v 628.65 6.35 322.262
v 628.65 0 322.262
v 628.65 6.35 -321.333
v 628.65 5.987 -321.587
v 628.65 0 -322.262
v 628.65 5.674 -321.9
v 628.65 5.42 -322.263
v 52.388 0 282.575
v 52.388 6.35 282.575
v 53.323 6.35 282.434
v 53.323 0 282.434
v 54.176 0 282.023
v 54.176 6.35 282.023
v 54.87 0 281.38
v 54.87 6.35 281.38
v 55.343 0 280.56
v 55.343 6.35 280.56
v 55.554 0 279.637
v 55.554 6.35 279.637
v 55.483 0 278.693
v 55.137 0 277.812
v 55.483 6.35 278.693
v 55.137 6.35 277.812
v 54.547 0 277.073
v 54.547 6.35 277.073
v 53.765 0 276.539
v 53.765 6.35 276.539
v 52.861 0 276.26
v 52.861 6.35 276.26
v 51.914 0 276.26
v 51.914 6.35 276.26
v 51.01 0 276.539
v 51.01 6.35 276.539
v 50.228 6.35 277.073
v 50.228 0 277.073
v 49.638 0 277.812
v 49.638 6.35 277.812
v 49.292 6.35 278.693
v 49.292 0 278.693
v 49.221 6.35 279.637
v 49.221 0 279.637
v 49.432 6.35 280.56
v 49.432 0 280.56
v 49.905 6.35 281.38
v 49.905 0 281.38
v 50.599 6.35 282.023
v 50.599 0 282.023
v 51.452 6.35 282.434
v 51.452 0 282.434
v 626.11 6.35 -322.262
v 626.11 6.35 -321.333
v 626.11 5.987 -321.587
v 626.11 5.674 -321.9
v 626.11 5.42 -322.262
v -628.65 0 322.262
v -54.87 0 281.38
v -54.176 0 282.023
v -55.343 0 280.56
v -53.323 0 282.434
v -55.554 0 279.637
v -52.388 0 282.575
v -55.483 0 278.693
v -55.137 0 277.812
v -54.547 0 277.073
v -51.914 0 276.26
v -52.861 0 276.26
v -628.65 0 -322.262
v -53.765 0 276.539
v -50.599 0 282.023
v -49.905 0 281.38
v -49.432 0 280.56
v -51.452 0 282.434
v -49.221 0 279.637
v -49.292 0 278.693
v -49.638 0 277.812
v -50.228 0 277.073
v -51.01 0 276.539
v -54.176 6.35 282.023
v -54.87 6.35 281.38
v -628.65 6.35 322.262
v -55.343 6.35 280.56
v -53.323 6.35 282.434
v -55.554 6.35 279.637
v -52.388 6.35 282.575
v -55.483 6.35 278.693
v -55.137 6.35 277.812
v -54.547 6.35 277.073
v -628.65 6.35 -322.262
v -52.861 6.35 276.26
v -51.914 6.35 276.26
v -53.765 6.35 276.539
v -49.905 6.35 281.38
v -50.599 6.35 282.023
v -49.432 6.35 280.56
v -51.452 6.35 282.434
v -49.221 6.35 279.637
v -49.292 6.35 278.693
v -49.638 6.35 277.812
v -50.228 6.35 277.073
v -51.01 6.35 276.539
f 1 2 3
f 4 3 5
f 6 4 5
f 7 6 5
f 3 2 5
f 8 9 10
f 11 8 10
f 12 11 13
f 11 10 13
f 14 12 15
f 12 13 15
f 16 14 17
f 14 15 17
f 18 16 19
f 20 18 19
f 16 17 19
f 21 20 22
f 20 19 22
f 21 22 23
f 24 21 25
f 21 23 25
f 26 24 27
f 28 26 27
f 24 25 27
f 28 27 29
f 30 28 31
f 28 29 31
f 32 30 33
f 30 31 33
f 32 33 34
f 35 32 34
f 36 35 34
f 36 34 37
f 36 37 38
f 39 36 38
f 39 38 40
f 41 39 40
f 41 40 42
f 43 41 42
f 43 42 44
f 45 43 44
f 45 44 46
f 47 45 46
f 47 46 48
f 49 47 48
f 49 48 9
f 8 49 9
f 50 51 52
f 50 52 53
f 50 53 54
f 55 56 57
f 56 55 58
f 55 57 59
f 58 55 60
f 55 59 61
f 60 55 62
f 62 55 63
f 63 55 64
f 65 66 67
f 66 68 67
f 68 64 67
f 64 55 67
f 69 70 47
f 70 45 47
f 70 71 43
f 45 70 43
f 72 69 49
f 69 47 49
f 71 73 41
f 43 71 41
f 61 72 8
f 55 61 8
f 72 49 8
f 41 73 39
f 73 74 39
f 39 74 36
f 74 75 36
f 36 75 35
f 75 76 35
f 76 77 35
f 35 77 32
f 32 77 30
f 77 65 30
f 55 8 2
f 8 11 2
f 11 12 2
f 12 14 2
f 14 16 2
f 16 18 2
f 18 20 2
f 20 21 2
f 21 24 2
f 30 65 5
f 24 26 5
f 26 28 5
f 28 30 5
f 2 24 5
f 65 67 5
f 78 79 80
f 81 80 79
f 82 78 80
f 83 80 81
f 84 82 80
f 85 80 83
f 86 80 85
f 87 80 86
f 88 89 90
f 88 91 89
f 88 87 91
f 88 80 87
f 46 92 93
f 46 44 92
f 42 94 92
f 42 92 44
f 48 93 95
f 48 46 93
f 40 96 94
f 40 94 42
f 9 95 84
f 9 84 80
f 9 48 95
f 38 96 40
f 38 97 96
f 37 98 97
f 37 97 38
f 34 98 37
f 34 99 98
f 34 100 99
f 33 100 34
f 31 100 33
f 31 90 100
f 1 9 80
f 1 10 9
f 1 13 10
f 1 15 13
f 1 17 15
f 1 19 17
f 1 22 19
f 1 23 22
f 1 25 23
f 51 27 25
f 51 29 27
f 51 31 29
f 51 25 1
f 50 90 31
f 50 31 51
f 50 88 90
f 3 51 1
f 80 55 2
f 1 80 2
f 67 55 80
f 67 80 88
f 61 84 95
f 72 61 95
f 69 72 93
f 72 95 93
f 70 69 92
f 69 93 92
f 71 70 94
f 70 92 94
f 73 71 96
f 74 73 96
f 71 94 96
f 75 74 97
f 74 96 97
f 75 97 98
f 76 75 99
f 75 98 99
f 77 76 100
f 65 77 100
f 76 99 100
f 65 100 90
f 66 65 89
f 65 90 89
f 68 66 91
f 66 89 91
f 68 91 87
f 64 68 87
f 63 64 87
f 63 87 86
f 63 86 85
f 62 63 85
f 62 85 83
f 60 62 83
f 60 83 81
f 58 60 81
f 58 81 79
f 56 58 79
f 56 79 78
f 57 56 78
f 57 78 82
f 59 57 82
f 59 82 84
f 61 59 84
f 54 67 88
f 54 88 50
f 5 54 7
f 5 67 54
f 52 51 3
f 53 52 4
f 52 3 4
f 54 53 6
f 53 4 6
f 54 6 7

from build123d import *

# Parameters (mm, degrees)
SKETCH1_W           = 1257.3
SKETCH1_H           = 644.525
BOSS_EXTRUDE1_DEPTH = 6.35
SKETCH2_R           = 3.175
CUT_EXTRUDE1_DEPTH  = 707.466038749
SKETCH3_R           = 2.54
CUT_EXTRUDE2_DEPTH  = 2.54


with BuildPart() as part:
    # Sketch1 → Boss-Extrude1 (new body)
    with BuildSketch(Plane(origin=(0, 0, 0), x_dir=(1, 0, 0), z_dir=(0, 1, 0))):
        Rectangle(SKETCH1_W, SKETCH1_H)
    extrude(amount=BOSS_EXTRUDE1_DEPTH)

    # Sketch2 → Cut-Extrude1 (cut, through all)
    with BuildSketch(Plane(origin=(0, 6.35, 0), x_dir=(1, 0, 0), z_dir=(0, 1, 0))):
        with Locations(Location((-52.3875, -279.4, 0), (0, 0, 270))):
            Circle(SKETCH2_R)
        with Locations(Location((52.3875, -279.4, 0), (0, 0, 270))):
            Circle(SKETCH2_R)
    extrude(amount=-CUT_EXTRUDE1_DEPTH, mode=Mode.SUBTRACT)

    # Sketch3 → Cut-Extrude2 (cut)
    with BuildSketch(Plane(origin=(628.65, 0, 0), x_dir=(0, 0, -1), z_dir=(1, 0, 0))):
        with Locations((323.5325, 7.62)):
            Circle(SKETCH3_R)
    extrude(amount=-CUT_EXTRUDE2_DEPTH, mode=Mode.SUBTRACT)


solid = part.part
